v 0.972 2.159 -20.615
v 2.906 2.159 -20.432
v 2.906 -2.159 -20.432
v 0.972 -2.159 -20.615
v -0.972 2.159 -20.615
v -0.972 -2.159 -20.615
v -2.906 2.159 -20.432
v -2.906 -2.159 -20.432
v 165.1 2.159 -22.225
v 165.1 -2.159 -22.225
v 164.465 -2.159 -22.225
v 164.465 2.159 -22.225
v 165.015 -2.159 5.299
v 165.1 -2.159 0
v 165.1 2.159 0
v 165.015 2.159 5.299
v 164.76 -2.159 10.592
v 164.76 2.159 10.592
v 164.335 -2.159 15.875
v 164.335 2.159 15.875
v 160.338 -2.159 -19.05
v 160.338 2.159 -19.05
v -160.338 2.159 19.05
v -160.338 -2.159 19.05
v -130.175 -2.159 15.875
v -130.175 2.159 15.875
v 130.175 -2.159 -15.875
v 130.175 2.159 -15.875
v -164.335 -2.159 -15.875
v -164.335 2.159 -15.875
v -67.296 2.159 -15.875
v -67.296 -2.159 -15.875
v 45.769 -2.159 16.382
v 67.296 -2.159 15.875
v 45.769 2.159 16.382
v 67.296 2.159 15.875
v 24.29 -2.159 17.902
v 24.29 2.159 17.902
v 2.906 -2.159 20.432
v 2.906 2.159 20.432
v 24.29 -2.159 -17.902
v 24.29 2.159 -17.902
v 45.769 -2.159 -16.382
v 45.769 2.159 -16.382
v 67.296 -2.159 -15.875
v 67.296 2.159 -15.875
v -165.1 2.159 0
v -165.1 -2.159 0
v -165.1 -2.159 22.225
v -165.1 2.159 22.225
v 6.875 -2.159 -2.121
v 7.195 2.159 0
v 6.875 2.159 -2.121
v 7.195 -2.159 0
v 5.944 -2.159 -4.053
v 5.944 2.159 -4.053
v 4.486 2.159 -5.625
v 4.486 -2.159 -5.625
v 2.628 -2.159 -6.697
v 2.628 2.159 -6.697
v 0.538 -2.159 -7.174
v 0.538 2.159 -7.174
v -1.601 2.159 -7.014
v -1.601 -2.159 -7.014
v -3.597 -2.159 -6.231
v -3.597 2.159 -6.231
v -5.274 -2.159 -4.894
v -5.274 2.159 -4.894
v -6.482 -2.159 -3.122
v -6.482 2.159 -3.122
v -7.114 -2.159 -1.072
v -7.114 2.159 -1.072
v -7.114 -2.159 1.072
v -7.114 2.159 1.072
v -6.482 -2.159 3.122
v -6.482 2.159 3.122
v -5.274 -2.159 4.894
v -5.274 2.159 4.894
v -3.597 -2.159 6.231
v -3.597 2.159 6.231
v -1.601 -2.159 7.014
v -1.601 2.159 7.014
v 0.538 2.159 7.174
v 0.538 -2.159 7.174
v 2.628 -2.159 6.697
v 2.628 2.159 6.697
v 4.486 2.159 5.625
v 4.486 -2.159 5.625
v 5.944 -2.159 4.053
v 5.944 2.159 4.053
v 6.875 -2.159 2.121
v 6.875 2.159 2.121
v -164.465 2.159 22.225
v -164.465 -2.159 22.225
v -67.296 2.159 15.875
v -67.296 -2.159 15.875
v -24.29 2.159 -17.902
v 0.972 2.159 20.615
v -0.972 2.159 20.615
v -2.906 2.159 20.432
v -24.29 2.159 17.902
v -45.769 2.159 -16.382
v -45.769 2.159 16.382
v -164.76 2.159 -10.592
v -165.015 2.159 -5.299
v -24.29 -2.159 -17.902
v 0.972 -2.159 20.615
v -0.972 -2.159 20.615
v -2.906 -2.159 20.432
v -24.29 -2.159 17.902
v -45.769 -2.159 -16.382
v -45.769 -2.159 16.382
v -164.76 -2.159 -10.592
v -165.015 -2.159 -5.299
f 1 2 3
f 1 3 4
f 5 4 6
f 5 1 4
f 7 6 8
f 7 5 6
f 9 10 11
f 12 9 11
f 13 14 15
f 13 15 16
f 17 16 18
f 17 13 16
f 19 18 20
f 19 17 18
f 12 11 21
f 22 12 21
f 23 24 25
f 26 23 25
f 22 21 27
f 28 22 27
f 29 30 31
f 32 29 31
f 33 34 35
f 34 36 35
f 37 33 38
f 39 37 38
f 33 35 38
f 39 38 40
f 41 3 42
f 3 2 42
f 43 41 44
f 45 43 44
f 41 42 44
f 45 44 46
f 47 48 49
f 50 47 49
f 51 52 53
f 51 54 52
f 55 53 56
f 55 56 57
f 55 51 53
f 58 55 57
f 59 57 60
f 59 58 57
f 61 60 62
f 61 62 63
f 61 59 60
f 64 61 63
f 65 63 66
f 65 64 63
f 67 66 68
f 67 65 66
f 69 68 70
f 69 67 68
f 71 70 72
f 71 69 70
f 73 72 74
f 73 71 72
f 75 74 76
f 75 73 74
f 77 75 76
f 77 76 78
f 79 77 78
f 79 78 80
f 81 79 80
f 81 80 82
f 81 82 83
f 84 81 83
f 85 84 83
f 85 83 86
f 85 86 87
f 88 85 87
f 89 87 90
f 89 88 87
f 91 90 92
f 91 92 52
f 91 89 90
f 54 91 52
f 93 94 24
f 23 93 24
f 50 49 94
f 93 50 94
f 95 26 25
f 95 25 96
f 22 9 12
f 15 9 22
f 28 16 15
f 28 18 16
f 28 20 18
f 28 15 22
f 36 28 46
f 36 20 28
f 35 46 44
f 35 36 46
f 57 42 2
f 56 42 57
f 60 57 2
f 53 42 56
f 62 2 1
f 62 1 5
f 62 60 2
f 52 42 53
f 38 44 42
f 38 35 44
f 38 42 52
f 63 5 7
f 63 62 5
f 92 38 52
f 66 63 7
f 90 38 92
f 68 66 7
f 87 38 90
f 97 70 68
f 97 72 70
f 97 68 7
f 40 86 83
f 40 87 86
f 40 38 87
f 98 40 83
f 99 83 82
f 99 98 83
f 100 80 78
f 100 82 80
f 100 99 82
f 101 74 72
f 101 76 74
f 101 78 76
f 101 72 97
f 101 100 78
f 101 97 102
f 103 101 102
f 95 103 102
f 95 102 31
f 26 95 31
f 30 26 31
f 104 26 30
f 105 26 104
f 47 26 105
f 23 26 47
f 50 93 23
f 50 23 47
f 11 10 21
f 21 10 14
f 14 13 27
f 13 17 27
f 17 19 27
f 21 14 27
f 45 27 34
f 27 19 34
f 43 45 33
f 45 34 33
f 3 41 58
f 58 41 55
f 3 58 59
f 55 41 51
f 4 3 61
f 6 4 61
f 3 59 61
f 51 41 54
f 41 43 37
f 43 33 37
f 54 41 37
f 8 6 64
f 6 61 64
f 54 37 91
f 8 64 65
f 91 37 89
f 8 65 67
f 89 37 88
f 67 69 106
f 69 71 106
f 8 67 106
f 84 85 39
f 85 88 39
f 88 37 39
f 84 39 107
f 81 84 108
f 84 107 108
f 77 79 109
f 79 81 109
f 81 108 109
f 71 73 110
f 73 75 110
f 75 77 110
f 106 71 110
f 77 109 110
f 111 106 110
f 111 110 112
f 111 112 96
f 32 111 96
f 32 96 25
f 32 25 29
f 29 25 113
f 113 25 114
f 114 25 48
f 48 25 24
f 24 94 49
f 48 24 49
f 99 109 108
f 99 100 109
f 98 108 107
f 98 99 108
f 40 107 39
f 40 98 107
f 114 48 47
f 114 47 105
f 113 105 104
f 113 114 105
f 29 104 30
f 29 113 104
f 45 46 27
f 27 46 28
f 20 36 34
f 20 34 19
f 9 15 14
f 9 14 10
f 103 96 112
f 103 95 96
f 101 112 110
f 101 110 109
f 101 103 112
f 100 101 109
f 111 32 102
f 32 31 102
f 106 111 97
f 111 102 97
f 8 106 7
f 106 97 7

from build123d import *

# Parameters (mm, degrees)
SKETCH1_W           = 330.2
SKETCH1_H           = 31.75
SKETCH1_R           = 7.19455
BOSS_EXTRUDE1_DEPTH = 2.159
SKETCH2_R           = 20.6375
SKETCH2_R_2         = 7.19455
BOSS_EXTRUDE2_DEPTH = 4.318
FILLET1_R           = 457.2
BOSS_EXTRUDE3_DEPTH = 4.318
CUT_EXTRUDE2_DEPTH  = 5.318


with BuildPart() as part:
    # Sketch1 → Boss-Extrude1 (new body, symmetric)
    with BuildSketch(Plane(origin=(0, 0, 0), x_dir=(1, 0, 0), z_dir=(0, 1, 0))):
        Rectangle(SKETCH1_W, SKETCH1_H)
        Circle(SKETCH1_R, mode=Mode.SUBTRACT)
    extrude(amount=BOSS_EXTRUDE1_DEPTH, both=True)

    # Sketch2 → Boss-Extrude2 (add)
    with BuildSketch(Plane(origin=(0, 2.159, 0), x_dir=(1, 0, 0), z_dir=(0, 1, 0))):
        Circle(SKETCH2_R)
        Circle(SKETCH2_R_2, mode=Mode.SUBTRACT)
    extrude(amount=-BOSS_EXTRUDE2_DEPTH)

    # Fillet1
    fillet1_edges = [part.edges().sort_by_distance(p)[0] for p in [
        (13.186765382, 0, 15.875),
        (-13.186765382, 0, 15.875),
        (13.186765382, 0, -15.875),
        (-13.186765382, 0, -15.875),
    ]]
    fillet(fillet1_edges, radius=FILLET1_R)

    # Sketch5 → Boss-Extrude3 (add)
    with BuildSketch(Plane.XZ.offset(2.159)):
        Polygon((-165.1, 15.875), (-165.1, 22.225), (-164.465, 22.225), (-160.3375, 19.05), (-130.175, 15.875), align=None)
        Polygon((165.1, -15.875), (165.1, -22.225), (164.465, -22.225), (160.3375, -19.05), (130.175, -15.875), align=None)
    extrude(amount=-BOSS_EXTRUDE3_DEPTH)

    # Sketch7 → Cut-Extrude2 (cut, through all)
    with BuildSketch(Plane.XZ.offset(2.159)):
        with BuildLine():
            Line((164.335006542, 15.875), (165.1, 15.875))
            Line((165.1, 15.875), (165.1, 0))
            ThreePointArc((165.1, 0), (164.908640738, 7.94671064), (164.335006542, 15.875))
        make_face()
        with BuildLine():
            Line((-164.335006542, -15.875), (-165.1, -15.875))
            Line((-165.1, -15.875), (-165.1, 0))
            ThreePointArc((-165.1, 0), (-164.908640738, -7.94671064), (-164.335006542, -15.875))
        make_face()
    extrude(amount=-CUT_EXTRUDE2_DEPTH, mode=Mode.SUBTRACT)


solid = part.part
